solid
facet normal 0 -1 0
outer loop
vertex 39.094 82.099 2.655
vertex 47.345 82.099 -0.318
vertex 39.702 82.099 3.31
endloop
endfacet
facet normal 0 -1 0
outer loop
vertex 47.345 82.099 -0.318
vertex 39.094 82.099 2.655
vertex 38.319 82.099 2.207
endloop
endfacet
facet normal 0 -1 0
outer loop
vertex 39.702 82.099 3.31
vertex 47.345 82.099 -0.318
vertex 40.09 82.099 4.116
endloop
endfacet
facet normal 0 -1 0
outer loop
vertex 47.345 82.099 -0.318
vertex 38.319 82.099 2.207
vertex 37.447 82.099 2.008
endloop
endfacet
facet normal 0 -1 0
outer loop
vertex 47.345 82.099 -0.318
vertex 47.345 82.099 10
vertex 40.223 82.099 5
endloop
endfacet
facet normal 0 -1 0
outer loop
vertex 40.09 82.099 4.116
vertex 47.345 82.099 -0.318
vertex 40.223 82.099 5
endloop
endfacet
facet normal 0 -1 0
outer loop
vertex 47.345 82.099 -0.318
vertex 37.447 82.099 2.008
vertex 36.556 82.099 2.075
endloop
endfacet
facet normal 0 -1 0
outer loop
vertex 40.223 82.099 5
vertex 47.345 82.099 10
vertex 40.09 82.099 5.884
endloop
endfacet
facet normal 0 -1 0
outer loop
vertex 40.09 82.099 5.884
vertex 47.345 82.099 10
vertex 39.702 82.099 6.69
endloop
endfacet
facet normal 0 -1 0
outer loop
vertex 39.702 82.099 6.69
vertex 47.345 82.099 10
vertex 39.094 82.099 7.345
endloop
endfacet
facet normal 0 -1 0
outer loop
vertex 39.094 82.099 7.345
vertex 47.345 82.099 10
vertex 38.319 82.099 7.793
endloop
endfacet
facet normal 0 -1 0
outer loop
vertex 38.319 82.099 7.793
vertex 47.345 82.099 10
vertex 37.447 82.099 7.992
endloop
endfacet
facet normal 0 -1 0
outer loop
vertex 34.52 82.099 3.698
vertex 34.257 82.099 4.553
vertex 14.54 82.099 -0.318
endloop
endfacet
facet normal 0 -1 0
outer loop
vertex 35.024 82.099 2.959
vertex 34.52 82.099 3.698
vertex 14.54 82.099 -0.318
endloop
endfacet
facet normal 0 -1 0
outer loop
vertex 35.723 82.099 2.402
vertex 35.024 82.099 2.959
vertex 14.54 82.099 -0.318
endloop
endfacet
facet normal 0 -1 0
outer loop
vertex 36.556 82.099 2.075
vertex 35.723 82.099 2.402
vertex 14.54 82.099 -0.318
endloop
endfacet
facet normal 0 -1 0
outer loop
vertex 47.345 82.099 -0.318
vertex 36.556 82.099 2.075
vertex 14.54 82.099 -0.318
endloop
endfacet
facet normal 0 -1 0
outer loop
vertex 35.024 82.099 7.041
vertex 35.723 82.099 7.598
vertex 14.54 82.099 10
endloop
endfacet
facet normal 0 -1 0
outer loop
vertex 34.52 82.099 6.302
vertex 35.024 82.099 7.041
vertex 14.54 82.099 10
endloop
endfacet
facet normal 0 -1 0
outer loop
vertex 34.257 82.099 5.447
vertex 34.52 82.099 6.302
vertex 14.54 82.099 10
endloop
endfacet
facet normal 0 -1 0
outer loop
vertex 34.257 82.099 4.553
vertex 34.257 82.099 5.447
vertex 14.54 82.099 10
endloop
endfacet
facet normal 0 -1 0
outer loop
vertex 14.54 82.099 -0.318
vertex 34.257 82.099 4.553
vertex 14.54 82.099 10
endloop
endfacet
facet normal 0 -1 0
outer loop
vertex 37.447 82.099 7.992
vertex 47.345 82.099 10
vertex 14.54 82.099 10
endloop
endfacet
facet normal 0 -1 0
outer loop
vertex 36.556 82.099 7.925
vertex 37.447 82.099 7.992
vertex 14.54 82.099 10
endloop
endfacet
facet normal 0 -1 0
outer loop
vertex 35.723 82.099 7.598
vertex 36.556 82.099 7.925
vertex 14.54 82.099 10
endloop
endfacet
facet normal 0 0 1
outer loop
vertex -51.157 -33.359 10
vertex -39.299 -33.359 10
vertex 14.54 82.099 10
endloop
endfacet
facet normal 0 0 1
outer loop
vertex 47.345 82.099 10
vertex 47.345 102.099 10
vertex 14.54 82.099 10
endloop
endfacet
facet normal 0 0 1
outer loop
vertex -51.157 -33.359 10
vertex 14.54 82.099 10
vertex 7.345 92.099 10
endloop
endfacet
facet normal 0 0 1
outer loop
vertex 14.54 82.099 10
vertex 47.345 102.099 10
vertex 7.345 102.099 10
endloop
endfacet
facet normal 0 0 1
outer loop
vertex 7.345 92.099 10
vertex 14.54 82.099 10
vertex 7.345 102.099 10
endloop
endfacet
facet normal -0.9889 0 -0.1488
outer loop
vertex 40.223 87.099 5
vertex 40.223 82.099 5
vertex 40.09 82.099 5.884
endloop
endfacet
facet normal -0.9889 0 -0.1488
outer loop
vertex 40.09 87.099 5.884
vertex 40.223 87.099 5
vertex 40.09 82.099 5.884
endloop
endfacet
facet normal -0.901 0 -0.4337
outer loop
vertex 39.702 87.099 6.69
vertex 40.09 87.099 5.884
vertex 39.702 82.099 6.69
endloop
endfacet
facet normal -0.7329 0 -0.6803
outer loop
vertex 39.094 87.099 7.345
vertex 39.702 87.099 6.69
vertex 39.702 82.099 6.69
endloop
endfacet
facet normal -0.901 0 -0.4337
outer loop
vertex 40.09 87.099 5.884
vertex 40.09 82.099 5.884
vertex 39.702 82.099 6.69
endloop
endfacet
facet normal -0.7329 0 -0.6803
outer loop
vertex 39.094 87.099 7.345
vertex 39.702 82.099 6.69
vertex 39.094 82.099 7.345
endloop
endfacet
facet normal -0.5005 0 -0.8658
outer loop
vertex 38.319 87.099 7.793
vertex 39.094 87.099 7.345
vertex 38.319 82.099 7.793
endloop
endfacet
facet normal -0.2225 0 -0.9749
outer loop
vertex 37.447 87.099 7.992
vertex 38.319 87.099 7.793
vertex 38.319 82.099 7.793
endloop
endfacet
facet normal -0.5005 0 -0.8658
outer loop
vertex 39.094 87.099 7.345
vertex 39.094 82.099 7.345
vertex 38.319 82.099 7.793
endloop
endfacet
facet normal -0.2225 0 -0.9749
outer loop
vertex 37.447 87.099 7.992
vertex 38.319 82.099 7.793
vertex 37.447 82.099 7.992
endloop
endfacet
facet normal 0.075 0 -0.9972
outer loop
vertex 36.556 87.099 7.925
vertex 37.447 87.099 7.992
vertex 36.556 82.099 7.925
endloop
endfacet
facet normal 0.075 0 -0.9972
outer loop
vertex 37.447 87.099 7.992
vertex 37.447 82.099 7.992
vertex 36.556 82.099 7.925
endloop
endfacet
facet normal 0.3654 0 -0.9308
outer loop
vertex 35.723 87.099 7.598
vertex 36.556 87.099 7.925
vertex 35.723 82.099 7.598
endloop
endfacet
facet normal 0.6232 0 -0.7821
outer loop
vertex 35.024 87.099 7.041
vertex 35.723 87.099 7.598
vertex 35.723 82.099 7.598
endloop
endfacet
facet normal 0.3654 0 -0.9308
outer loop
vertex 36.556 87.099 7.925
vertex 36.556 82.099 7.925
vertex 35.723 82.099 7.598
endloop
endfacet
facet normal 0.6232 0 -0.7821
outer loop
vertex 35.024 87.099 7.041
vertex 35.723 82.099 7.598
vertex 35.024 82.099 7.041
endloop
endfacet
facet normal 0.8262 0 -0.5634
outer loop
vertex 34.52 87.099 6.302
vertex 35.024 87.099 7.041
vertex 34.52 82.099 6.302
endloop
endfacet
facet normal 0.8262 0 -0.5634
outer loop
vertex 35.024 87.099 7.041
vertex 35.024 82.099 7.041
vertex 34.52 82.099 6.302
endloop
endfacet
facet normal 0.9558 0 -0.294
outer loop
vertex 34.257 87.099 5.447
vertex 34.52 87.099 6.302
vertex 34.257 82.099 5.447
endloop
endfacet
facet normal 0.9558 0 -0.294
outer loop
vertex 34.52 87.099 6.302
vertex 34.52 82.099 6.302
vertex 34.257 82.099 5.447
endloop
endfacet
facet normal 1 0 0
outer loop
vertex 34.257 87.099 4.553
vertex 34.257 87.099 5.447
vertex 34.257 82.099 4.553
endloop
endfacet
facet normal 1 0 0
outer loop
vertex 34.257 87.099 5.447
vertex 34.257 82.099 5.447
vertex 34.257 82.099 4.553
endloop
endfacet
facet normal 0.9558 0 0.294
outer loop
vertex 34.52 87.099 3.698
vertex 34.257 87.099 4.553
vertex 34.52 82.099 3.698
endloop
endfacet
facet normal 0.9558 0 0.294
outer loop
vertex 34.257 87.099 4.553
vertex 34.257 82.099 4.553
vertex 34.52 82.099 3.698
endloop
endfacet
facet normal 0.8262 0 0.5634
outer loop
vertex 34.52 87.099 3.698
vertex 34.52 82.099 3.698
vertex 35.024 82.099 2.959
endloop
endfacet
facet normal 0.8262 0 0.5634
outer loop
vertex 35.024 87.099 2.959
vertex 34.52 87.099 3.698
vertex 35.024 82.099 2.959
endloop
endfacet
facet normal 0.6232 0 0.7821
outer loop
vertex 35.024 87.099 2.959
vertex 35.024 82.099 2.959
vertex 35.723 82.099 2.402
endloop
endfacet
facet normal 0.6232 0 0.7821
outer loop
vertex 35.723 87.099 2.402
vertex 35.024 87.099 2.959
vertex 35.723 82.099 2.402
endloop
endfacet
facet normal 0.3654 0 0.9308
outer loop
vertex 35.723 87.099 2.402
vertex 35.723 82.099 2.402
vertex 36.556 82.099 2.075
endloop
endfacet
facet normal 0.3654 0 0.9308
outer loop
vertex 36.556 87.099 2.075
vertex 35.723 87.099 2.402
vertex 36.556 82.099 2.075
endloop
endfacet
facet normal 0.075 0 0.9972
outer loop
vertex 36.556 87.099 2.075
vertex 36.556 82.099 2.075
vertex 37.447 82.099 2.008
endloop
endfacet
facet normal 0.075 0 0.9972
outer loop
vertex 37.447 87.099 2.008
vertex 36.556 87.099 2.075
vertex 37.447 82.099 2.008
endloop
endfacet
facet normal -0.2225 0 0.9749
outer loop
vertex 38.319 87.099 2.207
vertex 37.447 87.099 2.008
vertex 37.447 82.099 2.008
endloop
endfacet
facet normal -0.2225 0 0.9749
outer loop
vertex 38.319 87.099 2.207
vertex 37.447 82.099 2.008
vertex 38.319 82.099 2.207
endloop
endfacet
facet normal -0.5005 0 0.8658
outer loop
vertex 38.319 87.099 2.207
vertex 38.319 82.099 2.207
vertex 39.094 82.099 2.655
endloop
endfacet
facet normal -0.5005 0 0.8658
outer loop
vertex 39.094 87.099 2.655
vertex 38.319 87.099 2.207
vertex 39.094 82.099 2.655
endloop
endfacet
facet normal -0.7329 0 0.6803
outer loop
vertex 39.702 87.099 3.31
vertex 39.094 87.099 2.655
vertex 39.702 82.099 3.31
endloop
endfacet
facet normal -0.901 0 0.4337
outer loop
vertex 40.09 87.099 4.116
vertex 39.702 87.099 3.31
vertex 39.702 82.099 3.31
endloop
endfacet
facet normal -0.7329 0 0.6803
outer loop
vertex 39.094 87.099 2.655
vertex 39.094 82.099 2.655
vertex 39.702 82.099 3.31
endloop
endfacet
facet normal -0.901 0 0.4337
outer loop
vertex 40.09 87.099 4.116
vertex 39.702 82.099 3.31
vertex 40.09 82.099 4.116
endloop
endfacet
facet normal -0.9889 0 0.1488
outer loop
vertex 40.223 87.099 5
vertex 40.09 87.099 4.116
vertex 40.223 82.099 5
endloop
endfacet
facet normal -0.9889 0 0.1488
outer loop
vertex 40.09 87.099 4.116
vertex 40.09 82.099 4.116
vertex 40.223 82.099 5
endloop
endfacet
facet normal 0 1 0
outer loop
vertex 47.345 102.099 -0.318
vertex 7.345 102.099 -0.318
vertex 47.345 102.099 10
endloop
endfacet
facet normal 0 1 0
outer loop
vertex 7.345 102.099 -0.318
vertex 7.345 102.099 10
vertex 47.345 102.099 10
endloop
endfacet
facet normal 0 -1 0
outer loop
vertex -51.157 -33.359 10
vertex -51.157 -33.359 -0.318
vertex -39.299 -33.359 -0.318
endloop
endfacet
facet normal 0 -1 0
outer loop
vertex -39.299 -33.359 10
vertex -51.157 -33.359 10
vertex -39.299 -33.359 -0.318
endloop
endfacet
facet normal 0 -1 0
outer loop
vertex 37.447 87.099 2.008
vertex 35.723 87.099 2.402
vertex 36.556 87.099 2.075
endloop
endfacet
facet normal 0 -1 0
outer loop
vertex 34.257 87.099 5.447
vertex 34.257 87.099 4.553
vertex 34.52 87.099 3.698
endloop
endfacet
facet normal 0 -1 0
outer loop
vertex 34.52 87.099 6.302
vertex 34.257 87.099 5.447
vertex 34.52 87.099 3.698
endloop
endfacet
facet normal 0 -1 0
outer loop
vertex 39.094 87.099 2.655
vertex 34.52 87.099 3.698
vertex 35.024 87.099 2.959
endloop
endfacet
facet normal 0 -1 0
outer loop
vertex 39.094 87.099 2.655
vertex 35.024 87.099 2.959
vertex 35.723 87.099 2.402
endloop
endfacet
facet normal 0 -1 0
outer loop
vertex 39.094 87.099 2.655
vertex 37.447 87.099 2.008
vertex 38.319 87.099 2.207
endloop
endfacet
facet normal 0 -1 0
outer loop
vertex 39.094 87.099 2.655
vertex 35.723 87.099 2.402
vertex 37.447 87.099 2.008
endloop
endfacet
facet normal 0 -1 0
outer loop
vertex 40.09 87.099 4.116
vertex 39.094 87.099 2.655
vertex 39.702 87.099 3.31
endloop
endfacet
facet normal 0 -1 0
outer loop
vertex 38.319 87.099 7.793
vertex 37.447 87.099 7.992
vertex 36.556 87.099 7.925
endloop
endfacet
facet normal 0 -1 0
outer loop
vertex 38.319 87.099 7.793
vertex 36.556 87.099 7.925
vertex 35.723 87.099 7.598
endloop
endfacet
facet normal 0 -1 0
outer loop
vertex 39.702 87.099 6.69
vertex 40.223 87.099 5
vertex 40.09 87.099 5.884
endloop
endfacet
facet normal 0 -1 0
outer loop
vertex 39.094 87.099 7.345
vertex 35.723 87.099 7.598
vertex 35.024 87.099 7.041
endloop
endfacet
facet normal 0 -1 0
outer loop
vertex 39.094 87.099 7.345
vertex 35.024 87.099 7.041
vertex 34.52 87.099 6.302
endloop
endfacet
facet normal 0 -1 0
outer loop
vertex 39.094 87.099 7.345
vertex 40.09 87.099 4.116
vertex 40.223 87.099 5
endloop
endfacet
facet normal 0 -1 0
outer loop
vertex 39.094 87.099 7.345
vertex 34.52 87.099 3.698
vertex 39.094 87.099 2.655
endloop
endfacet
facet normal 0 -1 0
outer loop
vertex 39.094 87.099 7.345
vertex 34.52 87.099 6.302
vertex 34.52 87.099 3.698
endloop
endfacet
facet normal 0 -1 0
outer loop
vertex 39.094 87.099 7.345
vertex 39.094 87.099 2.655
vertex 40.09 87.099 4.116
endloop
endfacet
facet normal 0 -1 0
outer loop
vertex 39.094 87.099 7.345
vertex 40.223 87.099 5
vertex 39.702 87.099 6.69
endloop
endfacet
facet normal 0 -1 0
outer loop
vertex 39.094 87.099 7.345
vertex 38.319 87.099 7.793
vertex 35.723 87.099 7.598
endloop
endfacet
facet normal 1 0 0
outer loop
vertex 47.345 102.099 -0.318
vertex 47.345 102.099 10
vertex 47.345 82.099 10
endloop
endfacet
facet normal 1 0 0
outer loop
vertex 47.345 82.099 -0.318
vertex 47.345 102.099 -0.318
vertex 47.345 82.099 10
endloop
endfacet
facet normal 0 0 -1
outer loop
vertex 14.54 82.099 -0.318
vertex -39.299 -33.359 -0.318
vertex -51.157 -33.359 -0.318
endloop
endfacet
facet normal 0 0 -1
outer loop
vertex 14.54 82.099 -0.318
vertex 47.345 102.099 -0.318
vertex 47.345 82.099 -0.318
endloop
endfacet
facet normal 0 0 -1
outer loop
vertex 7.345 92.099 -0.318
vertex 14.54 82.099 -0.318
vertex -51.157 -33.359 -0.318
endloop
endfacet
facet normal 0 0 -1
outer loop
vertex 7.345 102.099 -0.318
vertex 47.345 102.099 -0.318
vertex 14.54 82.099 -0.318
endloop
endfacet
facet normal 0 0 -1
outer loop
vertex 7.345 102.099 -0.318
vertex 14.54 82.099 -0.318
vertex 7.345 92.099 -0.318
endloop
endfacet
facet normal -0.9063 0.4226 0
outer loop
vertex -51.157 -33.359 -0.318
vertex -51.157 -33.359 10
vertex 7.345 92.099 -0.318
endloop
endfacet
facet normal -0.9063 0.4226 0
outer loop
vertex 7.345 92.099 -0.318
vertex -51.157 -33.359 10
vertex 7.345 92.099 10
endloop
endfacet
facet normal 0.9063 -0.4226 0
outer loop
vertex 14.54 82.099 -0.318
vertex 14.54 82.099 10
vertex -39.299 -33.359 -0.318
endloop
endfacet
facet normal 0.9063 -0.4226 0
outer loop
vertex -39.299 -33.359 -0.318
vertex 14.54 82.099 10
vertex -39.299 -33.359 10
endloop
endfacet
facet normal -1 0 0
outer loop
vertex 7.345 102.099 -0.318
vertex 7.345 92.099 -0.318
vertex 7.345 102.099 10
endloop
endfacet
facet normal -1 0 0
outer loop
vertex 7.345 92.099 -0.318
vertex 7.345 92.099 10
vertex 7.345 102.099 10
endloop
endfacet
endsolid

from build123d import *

# Parameters (mm, degrees)
BOSS_EXTRUDE1_DEPTH      = 10
BOSS_EXTRUDE1_DEPTH_BACK = 0.318278283
SKETCH3_R                = 3
CUT_EXTRUDE1_DEPTH       = 5
CUT_EXTRUDE2_DEPTH       = 15


with BuildPart() as part:
    # Sketch2 → Boss-Extrude1 (new body, two sides)
    with BuildSketch(Plane.XY) as boss_extrude1_sk:
        Polygon((14.539831303, 82.09905821), (-41.416945568, -37.900637039), (-51.156779582, -33.358877849), (7.345216778, 92.09905821), (7.345216778, 102.09905821), (47.345216778, 102.09905821), (47.345216778, 82.09905821), align=None)
    extrude(amount=BOSS_EXTRUDE1_DEPTH)
    extrude(boss_extrude1_sk.sketch, amount=-BOSS_EXTRUDE1_DEPTH_BACK)

    # Sketch3 → Cut-Extrude1 (cut)
    with BuildSketch(Plane.XZ.offset(-82.09905821)):
        with Locations((37.223217292, 5)):
            Circle(SKETCH3_R)
    extrude(amount=-CUT_EXTRUDE1_DEPTH, mode=Mode.SUBTRACT)

    # Sketch4 → Cut-Extrude2 (cut)
    with BuildSketch(Plane(origin=(0, 0, -0.318278283), x_dir=(-1, 0, 0), z_dir=(0, 0, -1))):
        Polygon((51.156779582, -33.358877849), (39.299088476, -33.358877849), (41.416945568, -37.900637039), align=None)
    extrude(amount=-CUT_EXTRUDE2_DEPTH, mode=Mode.SUBTRACT)


solid = part.part
